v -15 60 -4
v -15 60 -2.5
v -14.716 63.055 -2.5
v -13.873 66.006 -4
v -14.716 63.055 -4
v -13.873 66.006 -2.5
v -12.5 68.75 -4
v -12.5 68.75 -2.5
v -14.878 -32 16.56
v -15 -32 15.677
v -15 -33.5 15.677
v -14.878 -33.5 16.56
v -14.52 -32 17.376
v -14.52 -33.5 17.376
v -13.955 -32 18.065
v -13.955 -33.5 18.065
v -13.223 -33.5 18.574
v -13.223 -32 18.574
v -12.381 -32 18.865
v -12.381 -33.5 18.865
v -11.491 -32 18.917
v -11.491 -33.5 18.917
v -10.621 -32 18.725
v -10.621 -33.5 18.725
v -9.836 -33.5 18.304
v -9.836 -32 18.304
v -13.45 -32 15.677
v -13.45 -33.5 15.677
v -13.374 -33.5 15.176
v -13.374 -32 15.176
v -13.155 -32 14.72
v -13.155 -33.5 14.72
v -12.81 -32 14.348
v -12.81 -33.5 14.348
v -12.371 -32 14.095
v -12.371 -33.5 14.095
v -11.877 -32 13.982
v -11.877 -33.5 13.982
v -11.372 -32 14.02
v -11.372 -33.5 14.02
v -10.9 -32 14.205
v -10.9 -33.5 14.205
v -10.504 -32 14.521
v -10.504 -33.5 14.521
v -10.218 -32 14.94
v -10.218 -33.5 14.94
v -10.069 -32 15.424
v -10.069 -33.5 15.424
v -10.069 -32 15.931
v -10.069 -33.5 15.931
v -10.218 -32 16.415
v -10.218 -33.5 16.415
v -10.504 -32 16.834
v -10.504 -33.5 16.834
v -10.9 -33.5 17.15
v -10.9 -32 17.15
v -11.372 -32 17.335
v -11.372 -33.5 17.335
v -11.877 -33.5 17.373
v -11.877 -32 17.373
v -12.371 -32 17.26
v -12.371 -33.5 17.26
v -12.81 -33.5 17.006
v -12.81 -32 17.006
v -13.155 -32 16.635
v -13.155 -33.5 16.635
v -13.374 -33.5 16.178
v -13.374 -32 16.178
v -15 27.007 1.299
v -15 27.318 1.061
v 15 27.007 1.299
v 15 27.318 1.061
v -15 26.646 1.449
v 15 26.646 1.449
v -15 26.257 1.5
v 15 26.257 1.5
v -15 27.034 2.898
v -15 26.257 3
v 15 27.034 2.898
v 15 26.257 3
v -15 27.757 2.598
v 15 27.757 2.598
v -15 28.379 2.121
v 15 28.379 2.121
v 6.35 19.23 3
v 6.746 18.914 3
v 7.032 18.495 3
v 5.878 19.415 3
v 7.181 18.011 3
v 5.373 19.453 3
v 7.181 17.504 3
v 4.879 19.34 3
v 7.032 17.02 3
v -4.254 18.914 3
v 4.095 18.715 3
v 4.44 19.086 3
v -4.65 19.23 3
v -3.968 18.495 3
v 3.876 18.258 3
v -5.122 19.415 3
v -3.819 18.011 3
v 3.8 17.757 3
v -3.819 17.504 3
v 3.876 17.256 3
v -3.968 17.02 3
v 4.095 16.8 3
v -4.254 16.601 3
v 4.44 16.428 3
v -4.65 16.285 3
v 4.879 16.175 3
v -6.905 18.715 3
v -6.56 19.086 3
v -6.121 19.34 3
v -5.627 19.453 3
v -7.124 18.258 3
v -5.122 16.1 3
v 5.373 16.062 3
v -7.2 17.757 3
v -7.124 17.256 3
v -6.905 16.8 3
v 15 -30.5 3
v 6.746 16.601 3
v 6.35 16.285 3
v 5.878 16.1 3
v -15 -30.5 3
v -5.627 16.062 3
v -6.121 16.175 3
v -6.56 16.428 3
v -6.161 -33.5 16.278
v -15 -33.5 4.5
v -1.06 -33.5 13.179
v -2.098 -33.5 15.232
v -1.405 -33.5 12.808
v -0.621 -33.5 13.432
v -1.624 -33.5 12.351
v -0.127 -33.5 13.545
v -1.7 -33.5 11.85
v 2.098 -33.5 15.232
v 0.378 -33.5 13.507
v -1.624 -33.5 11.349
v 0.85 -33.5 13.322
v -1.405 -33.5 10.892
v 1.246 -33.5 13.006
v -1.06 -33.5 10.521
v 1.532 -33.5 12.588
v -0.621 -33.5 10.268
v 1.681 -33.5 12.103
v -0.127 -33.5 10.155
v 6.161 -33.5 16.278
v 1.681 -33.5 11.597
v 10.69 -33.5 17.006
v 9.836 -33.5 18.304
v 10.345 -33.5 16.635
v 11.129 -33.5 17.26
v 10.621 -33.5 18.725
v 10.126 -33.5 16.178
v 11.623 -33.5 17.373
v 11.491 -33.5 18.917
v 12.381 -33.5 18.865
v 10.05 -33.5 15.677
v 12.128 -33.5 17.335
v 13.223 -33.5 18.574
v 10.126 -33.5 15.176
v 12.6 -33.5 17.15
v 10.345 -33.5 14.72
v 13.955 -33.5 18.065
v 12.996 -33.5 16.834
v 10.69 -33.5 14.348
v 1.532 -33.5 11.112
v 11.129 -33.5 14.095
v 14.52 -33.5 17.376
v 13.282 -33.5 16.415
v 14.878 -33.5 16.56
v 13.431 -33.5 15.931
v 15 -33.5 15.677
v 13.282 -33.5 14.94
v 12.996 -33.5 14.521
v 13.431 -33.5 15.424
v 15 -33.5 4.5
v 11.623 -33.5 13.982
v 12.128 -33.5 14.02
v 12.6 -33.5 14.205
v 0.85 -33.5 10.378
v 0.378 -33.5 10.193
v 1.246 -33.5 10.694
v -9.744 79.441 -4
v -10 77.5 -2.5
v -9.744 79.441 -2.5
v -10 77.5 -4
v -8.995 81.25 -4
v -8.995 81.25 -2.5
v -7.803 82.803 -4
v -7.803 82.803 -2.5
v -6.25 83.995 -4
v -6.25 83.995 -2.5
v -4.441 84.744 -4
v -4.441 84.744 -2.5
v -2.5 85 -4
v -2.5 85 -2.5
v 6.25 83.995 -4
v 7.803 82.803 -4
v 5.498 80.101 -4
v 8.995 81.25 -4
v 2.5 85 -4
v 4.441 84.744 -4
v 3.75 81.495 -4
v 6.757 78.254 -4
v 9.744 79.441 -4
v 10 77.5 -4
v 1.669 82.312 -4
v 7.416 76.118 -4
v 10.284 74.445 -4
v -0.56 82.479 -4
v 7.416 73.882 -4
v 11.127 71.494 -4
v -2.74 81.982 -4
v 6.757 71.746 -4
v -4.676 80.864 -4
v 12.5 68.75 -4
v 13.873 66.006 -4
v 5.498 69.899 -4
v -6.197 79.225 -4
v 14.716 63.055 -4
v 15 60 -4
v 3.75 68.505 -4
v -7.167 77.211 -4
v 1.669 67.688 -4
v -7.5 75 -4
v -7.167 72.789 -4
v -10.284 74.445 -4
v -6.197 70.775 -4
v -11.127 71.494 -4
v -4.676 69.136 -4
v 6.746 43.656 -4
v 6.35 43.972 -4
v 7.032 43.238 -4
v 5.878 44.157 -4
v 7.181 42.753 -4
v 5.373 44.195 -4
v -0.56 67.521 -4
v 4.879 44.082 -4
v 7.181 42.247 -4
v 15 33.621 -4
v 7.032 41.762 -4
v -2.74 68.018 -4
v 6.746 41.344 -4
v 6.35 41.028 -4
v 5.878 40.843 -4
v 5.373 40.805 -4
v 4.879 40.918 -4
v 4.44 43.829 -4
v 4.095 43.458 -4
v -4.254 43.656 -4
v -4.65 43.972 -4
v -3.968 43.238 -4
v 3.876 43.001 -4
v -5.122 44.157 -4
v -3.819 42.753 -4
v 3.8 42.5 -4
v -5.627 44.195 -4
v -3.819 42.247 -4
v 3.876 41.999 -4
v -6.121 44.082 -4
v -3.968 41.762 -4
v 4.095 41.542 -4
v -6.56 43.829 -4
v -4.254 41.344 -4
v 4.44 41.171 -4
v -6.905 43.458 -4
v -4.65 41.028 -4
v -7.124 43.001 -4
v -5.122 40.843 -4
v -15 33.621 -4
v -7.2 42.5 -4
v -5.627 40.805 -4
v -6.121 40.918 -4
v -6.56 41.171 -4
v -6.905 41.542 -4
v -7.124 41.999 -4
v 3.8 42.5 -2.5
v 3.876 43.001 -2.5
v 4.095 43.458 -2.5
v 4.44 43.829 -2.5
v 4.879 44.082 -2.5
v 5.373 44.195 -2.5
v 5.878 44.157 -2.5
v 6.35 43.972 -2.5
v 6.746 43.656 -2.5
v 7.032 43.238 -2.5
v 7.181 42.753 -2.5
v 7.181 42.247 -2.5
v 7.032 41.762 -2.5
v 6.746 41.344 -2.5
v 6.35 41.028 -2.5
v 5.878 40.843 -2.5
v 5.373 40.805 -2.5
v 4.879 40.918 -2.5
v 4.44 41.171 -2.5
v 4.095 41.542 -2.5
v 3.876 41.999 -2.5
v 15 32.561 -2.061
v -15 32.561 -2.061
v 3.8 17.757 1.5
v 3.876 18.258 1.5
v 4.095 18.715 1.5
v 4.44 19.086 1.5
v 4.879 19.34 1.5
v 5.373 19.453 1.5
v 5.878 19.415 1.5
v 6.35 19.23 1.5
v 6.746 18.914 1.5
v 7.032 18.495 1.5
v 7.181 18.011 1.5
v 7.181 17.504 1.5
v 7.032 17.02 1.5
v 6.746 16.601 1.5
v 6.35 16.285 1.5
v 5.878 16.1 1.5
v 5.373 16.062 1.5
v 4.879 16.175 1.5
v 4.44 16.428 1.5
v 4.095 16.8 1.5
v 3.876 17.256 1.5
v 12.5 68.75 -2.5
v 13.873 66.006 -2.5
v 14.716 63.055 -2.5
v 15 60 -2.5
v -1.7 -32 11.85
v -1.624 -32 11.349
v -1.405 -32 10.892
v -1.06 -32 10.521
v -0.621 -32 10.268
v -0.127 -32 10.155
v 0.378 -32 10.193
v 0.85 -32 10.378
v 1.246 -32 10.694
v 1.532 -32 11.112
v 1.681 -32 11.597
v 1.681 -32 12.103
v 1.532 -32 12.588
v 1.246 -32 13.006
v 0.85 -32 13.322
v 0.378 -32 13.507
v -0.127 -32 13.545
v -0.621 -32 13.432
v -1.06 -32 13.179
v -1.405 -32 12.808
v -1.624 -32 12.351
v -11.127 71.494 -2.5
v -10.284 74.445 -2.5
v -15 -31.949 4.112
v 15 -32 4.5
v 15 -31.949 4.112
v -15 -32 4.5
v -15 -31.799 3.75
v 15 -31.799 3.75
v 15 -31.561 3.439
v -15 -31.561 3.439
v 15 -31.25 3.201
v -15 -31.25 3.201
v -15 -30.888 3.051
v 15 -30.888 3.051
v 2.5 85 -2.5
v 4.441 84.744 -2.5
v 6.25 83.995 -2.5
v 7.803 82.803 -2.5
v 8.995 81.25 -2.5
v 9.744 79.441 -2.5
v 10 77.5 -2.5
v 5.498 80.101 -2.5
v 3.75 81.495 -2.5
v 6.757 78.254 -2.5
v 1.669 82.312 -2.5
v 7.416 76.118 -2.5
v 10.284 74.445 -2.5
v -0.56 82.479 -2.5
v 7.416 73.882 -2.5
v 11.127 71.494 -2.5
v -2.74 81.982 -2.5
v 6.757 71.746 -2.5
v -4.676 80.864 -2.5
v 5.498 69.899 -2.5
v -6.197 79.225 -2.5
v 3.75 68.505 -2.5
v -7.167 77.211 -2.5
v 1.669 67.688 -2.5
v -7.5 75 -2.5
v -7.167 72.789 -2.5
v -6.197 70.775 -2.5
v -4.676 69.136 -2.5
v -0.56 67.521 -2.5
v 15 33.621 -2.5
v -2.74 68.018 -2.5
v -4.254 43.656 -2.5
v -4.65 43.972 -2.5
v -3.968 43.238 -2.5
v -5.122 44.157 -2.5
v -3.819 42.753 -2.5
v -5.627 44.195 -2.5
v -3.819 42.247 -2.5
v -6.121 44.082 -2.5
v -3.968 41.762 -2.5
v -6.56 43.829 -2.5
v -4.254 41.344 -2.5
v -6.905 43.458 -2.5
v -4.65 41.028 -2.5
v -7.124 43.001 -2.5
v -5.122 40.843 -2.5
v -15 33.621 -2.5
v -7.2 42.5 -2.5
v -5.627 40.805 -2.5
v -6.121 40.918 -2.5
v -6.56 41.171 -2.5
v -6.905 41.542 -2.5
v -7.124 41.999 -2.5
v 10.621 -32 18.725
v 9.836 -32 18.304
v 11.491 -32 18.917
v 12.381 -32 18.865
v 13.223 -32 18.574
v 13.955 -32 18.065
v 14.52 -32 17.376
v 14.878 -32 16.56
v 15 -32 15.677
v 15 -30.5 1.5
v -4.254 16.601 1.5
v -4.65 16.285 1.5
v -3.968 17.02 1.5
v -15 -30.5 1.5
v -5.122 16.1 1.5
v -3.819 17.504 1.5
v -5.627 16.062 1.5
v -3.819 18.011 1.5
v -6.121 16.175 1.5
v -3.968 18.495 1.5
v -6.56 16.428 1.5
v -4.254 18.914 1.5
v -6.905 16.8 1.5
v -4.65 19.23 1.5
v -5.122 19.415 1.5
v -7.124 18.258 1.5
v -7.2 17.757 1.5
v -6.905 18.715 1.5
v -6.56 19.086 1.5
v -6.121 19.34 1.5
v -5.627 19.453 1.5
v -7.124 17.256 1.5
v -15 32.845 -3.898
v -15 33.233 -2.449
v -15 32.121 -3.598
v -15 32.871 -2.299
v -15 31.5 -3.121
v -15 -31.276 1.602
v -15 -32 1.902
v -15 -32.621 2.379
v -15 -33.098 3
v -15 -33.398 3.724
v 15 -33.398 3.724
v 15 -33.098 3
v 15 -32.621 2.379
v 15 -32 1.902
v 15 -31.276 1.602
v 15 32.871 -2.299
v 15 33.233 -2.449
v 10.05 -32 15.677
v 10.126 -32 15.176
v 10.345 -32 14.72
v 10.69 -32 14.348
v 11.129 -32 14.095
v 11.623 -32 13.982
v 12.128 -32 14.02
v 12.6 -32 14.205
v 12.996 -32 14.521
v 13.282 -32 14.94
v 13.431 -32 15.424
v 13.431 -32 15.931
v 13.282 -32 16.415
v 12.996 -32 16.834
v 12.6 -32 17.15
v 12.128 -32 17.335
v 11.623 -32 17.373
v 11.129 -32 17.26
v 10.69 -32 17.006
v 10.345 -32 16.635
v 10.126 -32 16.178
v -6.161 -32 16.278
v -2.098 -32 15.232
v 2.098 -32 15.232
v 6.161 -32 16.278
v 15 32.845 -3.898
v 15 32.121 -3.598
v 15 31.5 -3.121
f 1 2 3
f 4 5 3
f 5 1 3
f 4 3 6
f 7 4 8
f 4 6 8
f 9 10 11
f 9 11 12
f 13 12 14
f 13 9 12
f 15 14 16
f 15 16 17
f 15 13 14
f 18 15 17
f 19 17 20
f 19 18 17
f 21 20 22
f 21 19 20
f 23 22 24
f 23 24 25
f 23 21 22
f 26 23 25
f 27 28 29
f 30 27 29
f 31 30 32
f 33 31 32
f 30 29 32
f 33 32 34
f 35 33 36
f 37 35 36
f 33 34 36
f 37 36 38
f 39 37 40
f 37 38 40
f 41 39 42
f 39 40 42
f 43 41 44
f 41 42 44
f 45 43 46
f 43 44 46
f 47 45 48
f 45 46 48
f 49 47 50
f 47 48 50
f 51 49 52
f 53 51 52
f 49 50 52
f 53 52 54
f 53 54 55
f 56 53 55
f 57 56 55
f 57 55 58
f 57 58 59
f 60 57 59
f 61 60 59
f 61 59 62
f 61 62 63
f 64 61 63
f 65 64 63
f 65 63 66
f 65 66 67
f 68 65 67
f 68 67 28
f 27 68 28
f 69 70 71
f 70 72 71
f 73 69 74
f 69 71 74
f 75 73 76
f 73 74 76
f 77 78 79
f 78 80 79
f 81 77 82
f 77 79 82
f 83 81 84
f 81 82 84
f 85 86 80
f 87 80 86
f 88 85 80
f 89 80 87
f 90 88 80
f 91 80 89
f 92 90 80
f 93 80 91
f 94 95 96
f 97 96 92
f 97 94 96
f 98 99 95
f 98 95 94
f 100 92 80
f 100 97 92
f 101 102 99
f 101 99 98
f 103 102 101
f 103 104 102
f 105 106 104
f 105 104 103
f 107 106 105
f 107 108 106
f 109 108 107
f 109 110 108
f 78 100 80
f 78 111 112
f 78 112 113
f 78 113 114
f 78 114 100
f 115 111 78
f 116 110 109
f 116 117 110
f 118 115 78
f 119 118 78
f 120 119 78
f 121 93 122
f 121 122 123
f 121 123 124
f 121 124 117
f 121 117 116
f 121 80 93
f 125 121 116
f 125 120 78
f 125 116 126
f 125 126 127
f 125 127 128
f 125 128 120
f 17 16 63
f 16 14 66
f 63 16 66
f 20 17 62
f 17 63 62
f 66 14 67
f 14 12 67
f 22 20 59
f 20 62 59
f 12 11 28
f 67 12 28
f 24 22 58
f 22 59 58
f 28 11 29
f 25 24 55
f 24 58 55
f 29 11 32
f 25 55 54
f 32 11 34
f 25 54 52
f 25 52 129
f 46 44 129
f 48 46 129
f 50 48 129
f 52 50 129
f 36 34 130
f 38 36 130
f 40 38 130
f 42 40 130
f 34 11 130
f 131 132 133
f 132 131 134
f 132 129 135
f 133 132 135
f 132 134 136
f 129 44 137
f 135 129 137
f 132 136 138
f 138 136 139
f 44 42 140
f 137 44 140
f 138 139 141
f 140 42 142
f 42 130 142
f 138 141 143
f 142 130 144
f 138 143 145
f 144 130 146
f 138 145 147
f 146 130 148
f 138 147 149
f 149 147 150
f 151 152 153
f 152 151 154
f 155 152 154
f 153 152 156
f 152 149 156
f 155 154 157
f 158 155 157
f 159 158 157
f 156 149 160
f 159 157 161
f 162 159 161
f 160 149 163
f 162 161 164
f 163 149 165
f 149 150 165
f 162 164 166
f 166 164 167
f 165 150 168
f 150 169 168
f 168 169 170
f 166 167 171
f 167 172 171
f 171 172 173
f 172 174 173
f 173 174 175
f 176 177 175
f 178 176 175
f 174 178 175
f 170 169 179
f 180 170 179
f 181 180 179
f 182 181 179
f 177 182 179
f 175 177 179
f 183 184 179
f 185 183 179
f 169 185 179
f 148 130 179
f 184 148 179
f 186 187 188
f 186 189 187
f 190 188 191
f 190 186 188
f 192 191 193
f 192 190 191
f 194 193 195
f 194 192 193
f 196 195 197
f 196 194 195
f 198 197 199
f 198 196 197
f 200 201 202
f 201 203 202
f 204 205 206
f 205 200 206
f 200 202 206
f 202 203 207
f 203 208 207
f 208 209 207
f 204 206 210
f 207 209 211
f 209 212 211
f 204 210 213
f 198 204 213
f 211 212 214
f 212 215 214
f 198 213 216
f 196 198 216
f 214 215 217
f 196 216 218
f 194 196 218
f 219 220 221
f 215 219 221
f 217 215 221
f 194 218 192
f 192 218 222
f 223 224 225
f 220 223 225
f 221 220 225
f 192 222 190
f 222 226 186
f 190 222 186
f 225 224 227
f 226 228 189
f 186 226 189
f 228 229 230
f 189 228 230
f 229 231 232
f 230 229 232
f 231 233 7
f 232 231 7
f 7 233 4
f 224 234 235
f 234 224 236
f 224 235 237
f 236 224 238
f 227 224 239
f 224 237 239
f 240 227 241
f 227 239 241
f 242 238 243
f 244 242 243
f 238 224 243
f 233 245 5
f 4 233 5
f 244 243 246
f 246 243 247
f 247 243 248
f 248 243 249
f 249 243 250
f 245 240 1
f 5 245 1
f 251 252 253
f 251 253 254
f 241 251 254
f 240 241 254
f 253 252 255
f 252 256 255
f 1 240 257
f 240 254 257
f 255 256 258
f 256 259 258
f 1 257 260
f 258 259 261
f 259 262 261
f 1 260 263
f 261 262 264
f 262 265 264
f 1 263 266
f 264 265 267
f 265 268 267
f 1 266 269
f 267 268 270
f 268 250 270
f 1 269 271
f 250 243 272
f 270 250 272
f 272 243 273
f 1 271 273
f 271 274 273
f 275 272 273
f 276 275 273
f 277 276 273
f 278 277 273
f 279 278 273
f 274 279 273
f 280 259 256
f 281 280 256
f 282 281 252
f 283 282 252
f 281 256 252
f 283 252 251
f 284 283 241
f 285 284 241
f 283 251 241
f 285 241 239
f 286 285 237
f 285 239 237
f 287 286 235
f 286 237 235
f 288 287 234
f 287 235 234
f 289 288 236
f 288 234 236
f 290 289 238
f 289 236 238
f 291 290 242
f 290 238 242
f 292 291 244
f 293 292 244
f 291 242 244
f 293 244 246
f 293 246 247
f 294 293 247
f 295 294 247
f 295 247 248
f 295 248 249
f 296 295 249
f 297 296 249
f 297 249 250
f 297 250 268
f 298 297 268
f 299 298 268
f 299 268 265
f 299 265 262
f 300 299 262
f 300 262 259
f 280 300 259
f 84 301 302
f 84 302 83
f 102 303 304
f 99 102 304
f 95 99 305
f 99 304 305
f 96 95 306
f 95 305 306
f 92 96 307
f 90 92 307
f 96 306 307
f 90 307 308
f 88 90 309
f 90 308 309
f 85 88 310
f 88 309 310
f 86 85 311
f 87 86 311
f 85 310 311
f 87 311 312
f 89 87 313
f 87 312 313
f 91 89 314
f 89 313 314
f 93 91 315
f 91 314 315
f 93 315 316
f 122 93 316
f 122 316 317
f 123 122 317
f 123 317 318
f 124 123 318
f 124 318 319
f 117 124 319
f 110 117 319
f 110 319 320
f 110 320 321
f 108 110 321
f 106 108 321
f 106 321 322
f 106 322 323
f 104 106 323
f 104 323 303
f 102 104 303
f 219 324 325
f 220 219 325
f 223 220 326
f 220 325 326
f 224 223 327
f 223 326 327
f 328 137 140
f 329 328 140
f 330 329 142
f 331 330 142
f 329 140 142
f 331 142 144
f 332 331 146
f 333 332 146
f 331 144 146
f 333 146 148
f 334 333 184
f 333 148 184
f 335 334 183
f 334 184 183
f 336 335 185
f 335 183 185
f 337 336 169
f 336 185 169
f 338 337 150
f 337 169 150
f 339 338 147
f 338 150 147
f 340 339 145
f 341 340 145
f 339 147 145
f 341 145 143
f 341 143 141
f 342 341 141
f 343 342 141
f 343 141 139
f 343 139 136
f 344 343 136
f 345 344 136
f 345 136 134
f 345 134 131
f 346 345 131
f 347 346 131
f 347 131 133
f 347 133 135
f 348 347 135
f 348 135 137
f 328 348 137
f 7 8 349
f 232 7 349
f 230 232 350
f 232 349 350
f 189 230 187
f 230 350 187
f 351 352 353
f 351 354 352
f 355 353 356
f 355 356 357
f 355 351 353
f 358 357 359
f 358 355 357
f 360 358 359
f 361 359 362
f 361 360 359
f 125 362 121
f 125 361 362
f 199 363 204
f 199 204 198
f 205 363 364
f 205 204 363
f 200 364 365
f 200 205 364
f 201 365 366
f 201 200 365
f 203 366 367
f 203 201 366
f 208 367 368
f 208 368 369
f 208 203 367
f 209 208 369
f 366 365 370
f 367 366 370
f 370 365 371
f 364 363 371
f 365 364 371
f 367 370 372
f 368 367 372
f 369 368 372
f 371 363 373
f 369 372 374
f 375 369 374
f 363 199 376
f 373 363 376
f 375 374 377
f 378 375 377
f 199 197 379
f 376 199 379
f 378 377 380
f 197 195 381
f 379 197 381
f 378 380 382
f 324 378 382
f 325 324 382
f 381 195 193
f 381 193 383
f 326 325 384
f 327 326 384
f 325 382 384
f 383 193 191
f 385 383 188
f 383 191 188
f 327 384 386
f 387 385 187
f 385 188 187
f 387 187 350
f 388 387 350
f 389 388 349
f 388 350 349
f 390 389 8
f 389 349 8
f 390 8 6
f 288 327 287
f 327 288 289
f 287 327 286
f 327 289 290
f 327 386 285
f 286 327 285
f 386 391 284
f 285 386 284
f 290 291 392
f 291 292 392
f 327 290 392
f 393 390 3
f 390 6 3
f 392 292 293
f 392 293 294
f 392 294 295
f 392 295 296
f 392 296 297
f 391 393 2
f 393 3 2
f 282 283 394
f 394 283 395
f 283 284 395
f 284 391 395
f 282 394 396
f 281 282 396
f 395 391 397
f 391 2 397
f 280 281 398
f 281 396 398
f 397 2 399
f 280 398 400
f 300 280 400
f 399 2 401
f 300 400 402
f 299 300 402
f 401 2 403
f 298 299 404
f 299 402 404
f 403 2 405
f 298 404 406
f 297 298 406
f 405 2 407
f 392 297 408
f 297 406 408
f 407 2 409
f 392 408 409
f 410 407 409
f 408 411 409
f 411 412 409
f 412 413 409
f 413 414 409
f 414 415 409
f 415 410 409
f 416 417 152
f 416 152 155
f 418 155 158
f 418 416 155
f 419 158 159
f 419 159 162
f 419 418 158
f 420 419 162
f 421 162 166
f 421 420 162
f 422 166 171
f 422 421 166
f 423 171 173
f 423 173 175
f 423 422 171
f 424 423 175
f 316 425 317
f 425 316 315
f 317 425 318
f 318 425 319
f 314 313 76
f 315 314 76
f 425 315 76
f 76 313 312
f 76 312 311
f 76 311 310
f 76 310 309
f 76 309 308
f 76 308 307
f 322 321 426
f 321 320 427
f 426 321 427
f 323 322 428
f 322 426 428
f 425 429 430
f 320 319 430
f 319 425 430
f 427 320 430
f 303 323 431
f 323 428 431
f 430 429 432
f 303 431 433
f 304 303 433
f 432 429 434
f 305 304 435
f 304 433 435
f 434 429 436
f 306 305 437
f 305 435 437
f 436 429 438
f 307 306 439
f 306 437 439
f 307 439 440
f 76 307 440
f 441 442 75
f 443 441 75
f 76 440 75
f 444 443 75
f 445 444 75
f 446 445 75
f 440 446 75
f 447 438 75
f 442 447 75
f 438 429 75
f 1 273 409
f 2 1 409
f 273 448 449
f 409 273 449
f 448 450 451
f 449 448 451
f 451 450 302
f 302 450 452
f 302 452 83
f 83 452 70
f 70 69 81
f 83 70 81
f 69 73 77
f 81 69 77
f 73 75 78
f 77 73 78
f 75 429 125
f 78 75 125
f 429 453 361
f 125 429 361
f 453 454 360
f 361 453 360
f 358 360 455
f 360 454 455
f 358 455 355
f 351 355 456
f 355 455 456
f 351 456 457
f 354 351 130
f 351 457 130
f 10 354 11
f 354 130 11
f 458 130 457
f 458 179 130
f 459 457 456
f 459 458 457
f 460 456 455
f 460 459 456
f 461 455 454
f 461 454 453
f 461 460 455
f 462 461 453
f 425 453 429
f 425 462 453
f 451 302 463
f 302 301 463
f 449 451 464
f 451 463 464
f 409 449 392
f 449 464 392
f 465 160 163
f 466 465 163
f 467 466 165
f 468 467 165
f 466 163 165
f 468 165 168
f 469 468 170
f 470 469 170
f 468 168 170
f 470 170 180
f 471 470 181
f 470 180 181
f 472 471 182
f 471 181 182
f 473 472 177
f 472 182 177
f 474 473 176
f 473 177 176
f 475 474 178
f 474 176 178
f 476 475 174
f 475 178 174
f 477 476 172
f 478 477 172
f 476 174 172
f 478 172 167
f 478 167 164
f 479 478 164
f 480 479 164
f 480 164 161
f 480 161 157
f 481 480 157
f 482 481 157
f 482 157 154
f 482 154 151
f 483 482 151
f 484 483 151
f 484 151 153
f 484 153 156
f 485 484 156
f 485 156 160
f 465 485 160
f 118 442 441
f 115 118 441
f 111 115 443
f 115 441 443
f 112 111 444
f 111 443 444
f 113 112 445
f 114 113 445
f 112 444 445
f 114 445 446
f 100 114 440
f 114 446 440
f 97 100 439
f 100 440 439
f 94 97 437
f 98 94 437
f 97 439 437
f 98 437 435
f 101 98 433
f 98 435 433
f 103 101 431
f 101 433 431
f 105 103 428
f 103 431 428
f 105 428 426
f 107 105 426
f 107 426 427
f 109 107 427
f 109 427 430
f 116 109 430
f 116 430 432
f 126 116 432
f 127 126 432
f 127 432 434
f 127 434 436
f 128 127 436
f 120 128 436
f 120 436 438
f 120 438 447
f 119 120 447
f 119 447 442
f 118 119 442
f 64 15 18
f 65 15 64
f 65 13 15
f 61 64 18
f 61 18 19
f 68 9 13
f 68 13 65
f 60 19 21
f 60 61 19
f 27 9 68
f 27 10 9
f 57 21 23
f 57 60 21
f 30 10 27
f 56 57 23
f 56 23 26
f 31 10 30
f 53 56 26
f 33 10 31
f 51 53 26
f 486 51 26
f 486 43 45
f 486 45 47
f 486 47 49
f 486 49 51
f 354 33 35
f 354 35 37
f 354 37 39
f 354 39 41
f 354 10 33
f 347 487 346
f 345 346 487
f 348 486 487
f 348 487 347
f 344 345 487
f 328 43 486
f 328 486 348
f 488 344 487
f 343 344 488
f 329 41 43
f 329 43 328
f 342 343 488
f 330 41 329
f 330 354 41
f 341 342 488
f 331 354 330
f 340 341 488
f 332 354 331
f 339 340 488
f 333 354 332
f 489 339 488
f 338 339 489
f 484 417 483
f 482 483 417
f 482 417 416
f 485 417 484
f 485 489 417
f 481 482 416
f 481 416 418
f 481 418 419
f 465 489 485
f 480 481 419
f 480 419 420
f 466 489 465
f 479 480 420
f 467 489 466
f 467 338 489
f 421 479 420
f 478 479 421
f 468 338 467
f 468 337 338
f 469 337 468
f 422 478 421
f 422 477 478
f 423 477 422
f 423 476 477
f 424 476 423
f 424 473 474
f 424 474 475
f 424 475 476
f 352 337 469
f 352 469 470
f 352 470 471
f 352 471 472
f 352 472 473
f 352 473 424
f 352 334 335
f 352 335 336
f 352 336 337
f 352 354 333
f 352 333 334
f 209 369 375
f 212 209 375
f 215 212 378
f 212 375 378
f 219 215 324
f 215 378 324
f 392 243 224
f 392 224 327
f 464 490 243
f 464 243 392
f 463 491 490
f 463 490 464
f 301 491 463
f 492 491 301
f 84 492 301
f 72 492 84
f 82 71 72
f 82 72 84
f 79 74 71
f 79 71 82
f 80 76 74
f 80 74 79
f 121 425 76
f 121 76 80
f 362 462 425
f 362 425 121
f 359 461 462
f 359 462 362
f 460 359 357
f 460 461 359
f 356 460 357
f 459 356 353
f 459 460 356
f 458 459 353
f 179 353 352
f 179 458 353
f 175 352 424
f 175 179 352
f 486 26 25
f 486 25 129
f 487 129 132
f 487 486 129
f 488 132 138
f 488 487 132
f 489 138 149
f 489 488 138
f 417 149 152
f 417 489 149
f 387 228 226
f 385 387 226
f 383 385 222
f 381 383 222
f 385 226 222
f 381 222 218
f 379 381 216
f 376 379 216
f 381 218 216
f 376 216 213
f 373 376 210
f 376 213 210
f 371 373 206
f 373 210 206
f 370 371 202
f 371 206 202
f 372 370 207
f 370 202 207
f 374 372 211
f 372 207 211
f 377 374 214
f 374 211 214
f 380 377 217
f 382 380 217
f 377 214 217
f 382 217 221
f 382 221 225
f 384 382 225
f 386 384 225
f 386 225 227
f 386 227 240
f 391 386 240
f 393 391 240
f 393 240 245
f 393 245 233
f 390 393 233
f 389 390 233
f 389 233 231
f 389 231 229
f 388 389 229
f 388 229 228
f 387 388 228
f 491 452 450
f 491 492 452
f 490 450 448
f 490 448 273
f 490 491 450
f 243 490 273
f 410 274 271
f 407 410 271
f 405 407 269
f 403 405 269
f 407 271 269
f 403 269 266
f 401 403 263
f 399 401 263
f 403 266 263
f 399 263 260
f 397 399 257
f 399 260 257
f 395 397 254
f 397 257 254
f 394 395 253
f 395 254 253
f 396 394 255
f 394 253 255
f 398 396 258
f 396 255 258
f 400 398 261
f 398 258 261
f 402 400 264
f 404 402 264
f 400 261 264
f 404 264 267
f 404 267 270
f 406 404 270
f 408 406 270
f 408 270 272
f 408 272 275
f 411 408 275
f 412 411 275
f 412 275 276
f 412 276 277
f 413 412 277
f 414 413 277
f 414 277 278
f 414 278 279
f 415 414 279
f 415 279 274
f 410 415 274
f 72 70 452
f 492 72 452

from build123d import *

# Parameters (mm, degrees)
EXTRUDE_1_DEPTH             = 1.5
SKETCH_2_W                  = 30
SKETCH_2_H                  = 7
EXTRUDE_2_DEPTH             = 117
CUT_EXTRUDE_1_DEPTH         = 93.104529713
CUT_EXTRUDE_2_DEPTH         = 89.933295899
CUT_EXTRUDE_3_DEPTH         = 89.933295899
CUT_EXTRUDE_4_DEPTH         = 93.104529713
HOLE_WIZARD_3_4_3_4_1_D     = 3.4
HOLE_WIZARD_3_4_3_4_1_DEPTH = 7
HOLE_WIZARD_3_4_3_4_2_D     = 3.4
HOLE_WIZARD_3_4_3_4_3_D     = 3.4
HOLE_WIZARD_15_0_15_1_D     = 15
FILLET_1_R                  = 1.5
FILLET_2_R                  = 3
FILLET_3_R                  = 7.5


with BuildPart() as part:
    # 草图1 → 凸台-拉伸1 (new body)
    with BuildSketch(Plane(origin=(0, -32, 0), x_dir=(1, 0, 0), z_dir=(0, 1, 0))):
        with BuildLine():
            Line((-15, 4), (-15, -15.677345132))
            ThreePointArc((-15, -15.677345132), (-13.223342916, -18.57419871), (-9.835839599, -18.303842792))
            ThreePointArc((-9.835839599, -18.303842792), (0, -15.1), (9.835839599, -18.303842792))
            ThreePointArc((9.835839599, -18.303842792), (13.223342916, -18.57419871), (15, -15.677345132))
            Line((15, -15.677345132), (15, 4))
            Line((15, 4), (-15, 4))
        make_face()
    extrude(amount=-EXTRUDE_1_DEPTH)

    # 草图2 → 凸台-拉伸2 (add)
    with BuildSketch(Plane(origin=(0, -32, 0), x_dir=(-1, 0, 0), z_dir=(0, 1, 0))):
        with Locations((0, -0.5)):
            Rectangle(SKETCH_2_W, SKETCH_2_H)
    extrude(amount=EXTRUDE_2_DEPTH)

    # 草图3 → 切除-拉伸1 (cut, through all)
    with BuildSketch(Plane.ZY.offset(15)):
        Polygon((3, 85), (-2.5, 85), (-2.5, 33), (3, 27.5), align=None)
    extrude(amount=-CUT_EXTRUDE_1_DEPTH, mode=Mode.SUBTRACT)

    # 草图4 → 切除-拉伸2 (cut, through all)
    with BuildSketch(Plane.XY.offset(-2.5)):
        with BuildLine():
            Line((-11.795428312, 85), (-15, 85))
            Line((-15, 85), (-15, 60))
            ThreePointArc((-15, 60), (-14.362740383, 64.550068681), (-12.5, 68.75))
            ThreePointArc((-12.5, 68.75), (-10.015546325, 76.782552918), (-11.795428312, 85))
        make_face()
    extrude(amount=-CUT_EXTRUDE_2_DEPTH, mode=Mode.SUBTRACT)

    # 草图5 → 切除-拉伸3 (cut, through all)
    with BuildSketch(Plane.XY.offset(-2.5)):
        with BuildLine():
            Line((15, 85), (11.795428312, 85))
            ThreePointArc((11.795428312, 85), (10.015546325, 76.782552918), (12.5, 68.75))
            ThreePointArc((12.5, 68.75), (14.362740383, 64.550068681), (15, 60))
            Line((15, 60), (15, 85))
        make_face()
    extrude(amount=-CUT_EXTRUDE_3_DEPTH, mode=Mode.SUBTRACT)

    # 草图6 → 切除-拉伸4 (cut, through all)
    with BuildSketch(Plane.ZY.offset(15)):
        Polygon((1.5, -33.5), (1.5, 26.878679656), (-4, 32.378679656), (-4, -33.5), align=None)
    extrude(amount=-CUT_EXTRUDE_4_DEPTH, mode=Mode.SUBTRACT)

    # Ø3.4 (3.4) 直径孔1
    with Locations(Plane.XY.offset(3)):
        with Locations((-5.5, 17.757359313), (5.5, 17.757359313)):
            Hole(HOLE_WIZARD_3_4_3_4_1_D / 2, depth=HOLE_WIZARD_3_4_3_4_1_DEPTH)

    # Ø3.4 (3.4) 直径孔2 (through all)
    with Locations(Plane.XY.offset(-2.5)):
        with Locations((-5.5, 42.5), (5.5, 42.5)):
            Hole(HOLE_WIZARD_3_4_3_4_2_D / 2)

    # Ø3.4 (3.4) 直径孔3 (through all)
    with Locations(Plane(origin=(0, -32, 0), x_dir=(1, 0, 0), z_dir=(0, 1, 0))):
        with Locations((-11.75, -15.677345132), (0, -11.85), (11.75, -15.677345132)):
            Hole(HOLE_WIZARD_3_4_3_4_3_D / 2)

    # Ø15.0 (15) 直径孔1 (through all)
    with Locations(Plane.XY.offset(-2.5)):
        with Locations((0, 75)):
            Hole(HOLE_WIZARD_15_0_15_1_D / 2)

    # 圆角1
    fillet_1_edges = [part.edges().sort_by_distance(p)[0] for p in [
        (0, -32, 3),
        (0, 33, -2.5),
        (0, 26.878679656, 1.5),
    ]]
    fillet(fillet_1_edges, radius=FILLET_1_R)

    # 圆角2
    fillet_2_edges = [part.edges().sort_by_distance(p)[0] for p in [
        (0, 27.5, 3),
        (0, -33.5, 1.5),
        (0, 32.378679656, -4),
    ]]
    fillet(fillet_2_edges, radius=FILLET_2_R)

    # 圆角3
    fillet_3_edges = [part.edges().sort_by_distance(p)[0] for p in [
        (-11.795428312, 85, -3.25),
        (11.795428312, 85, -3.25),
    ]]
    fillet(fillet_3_edges, radius=FILLET_3_R)


solid = part.part
